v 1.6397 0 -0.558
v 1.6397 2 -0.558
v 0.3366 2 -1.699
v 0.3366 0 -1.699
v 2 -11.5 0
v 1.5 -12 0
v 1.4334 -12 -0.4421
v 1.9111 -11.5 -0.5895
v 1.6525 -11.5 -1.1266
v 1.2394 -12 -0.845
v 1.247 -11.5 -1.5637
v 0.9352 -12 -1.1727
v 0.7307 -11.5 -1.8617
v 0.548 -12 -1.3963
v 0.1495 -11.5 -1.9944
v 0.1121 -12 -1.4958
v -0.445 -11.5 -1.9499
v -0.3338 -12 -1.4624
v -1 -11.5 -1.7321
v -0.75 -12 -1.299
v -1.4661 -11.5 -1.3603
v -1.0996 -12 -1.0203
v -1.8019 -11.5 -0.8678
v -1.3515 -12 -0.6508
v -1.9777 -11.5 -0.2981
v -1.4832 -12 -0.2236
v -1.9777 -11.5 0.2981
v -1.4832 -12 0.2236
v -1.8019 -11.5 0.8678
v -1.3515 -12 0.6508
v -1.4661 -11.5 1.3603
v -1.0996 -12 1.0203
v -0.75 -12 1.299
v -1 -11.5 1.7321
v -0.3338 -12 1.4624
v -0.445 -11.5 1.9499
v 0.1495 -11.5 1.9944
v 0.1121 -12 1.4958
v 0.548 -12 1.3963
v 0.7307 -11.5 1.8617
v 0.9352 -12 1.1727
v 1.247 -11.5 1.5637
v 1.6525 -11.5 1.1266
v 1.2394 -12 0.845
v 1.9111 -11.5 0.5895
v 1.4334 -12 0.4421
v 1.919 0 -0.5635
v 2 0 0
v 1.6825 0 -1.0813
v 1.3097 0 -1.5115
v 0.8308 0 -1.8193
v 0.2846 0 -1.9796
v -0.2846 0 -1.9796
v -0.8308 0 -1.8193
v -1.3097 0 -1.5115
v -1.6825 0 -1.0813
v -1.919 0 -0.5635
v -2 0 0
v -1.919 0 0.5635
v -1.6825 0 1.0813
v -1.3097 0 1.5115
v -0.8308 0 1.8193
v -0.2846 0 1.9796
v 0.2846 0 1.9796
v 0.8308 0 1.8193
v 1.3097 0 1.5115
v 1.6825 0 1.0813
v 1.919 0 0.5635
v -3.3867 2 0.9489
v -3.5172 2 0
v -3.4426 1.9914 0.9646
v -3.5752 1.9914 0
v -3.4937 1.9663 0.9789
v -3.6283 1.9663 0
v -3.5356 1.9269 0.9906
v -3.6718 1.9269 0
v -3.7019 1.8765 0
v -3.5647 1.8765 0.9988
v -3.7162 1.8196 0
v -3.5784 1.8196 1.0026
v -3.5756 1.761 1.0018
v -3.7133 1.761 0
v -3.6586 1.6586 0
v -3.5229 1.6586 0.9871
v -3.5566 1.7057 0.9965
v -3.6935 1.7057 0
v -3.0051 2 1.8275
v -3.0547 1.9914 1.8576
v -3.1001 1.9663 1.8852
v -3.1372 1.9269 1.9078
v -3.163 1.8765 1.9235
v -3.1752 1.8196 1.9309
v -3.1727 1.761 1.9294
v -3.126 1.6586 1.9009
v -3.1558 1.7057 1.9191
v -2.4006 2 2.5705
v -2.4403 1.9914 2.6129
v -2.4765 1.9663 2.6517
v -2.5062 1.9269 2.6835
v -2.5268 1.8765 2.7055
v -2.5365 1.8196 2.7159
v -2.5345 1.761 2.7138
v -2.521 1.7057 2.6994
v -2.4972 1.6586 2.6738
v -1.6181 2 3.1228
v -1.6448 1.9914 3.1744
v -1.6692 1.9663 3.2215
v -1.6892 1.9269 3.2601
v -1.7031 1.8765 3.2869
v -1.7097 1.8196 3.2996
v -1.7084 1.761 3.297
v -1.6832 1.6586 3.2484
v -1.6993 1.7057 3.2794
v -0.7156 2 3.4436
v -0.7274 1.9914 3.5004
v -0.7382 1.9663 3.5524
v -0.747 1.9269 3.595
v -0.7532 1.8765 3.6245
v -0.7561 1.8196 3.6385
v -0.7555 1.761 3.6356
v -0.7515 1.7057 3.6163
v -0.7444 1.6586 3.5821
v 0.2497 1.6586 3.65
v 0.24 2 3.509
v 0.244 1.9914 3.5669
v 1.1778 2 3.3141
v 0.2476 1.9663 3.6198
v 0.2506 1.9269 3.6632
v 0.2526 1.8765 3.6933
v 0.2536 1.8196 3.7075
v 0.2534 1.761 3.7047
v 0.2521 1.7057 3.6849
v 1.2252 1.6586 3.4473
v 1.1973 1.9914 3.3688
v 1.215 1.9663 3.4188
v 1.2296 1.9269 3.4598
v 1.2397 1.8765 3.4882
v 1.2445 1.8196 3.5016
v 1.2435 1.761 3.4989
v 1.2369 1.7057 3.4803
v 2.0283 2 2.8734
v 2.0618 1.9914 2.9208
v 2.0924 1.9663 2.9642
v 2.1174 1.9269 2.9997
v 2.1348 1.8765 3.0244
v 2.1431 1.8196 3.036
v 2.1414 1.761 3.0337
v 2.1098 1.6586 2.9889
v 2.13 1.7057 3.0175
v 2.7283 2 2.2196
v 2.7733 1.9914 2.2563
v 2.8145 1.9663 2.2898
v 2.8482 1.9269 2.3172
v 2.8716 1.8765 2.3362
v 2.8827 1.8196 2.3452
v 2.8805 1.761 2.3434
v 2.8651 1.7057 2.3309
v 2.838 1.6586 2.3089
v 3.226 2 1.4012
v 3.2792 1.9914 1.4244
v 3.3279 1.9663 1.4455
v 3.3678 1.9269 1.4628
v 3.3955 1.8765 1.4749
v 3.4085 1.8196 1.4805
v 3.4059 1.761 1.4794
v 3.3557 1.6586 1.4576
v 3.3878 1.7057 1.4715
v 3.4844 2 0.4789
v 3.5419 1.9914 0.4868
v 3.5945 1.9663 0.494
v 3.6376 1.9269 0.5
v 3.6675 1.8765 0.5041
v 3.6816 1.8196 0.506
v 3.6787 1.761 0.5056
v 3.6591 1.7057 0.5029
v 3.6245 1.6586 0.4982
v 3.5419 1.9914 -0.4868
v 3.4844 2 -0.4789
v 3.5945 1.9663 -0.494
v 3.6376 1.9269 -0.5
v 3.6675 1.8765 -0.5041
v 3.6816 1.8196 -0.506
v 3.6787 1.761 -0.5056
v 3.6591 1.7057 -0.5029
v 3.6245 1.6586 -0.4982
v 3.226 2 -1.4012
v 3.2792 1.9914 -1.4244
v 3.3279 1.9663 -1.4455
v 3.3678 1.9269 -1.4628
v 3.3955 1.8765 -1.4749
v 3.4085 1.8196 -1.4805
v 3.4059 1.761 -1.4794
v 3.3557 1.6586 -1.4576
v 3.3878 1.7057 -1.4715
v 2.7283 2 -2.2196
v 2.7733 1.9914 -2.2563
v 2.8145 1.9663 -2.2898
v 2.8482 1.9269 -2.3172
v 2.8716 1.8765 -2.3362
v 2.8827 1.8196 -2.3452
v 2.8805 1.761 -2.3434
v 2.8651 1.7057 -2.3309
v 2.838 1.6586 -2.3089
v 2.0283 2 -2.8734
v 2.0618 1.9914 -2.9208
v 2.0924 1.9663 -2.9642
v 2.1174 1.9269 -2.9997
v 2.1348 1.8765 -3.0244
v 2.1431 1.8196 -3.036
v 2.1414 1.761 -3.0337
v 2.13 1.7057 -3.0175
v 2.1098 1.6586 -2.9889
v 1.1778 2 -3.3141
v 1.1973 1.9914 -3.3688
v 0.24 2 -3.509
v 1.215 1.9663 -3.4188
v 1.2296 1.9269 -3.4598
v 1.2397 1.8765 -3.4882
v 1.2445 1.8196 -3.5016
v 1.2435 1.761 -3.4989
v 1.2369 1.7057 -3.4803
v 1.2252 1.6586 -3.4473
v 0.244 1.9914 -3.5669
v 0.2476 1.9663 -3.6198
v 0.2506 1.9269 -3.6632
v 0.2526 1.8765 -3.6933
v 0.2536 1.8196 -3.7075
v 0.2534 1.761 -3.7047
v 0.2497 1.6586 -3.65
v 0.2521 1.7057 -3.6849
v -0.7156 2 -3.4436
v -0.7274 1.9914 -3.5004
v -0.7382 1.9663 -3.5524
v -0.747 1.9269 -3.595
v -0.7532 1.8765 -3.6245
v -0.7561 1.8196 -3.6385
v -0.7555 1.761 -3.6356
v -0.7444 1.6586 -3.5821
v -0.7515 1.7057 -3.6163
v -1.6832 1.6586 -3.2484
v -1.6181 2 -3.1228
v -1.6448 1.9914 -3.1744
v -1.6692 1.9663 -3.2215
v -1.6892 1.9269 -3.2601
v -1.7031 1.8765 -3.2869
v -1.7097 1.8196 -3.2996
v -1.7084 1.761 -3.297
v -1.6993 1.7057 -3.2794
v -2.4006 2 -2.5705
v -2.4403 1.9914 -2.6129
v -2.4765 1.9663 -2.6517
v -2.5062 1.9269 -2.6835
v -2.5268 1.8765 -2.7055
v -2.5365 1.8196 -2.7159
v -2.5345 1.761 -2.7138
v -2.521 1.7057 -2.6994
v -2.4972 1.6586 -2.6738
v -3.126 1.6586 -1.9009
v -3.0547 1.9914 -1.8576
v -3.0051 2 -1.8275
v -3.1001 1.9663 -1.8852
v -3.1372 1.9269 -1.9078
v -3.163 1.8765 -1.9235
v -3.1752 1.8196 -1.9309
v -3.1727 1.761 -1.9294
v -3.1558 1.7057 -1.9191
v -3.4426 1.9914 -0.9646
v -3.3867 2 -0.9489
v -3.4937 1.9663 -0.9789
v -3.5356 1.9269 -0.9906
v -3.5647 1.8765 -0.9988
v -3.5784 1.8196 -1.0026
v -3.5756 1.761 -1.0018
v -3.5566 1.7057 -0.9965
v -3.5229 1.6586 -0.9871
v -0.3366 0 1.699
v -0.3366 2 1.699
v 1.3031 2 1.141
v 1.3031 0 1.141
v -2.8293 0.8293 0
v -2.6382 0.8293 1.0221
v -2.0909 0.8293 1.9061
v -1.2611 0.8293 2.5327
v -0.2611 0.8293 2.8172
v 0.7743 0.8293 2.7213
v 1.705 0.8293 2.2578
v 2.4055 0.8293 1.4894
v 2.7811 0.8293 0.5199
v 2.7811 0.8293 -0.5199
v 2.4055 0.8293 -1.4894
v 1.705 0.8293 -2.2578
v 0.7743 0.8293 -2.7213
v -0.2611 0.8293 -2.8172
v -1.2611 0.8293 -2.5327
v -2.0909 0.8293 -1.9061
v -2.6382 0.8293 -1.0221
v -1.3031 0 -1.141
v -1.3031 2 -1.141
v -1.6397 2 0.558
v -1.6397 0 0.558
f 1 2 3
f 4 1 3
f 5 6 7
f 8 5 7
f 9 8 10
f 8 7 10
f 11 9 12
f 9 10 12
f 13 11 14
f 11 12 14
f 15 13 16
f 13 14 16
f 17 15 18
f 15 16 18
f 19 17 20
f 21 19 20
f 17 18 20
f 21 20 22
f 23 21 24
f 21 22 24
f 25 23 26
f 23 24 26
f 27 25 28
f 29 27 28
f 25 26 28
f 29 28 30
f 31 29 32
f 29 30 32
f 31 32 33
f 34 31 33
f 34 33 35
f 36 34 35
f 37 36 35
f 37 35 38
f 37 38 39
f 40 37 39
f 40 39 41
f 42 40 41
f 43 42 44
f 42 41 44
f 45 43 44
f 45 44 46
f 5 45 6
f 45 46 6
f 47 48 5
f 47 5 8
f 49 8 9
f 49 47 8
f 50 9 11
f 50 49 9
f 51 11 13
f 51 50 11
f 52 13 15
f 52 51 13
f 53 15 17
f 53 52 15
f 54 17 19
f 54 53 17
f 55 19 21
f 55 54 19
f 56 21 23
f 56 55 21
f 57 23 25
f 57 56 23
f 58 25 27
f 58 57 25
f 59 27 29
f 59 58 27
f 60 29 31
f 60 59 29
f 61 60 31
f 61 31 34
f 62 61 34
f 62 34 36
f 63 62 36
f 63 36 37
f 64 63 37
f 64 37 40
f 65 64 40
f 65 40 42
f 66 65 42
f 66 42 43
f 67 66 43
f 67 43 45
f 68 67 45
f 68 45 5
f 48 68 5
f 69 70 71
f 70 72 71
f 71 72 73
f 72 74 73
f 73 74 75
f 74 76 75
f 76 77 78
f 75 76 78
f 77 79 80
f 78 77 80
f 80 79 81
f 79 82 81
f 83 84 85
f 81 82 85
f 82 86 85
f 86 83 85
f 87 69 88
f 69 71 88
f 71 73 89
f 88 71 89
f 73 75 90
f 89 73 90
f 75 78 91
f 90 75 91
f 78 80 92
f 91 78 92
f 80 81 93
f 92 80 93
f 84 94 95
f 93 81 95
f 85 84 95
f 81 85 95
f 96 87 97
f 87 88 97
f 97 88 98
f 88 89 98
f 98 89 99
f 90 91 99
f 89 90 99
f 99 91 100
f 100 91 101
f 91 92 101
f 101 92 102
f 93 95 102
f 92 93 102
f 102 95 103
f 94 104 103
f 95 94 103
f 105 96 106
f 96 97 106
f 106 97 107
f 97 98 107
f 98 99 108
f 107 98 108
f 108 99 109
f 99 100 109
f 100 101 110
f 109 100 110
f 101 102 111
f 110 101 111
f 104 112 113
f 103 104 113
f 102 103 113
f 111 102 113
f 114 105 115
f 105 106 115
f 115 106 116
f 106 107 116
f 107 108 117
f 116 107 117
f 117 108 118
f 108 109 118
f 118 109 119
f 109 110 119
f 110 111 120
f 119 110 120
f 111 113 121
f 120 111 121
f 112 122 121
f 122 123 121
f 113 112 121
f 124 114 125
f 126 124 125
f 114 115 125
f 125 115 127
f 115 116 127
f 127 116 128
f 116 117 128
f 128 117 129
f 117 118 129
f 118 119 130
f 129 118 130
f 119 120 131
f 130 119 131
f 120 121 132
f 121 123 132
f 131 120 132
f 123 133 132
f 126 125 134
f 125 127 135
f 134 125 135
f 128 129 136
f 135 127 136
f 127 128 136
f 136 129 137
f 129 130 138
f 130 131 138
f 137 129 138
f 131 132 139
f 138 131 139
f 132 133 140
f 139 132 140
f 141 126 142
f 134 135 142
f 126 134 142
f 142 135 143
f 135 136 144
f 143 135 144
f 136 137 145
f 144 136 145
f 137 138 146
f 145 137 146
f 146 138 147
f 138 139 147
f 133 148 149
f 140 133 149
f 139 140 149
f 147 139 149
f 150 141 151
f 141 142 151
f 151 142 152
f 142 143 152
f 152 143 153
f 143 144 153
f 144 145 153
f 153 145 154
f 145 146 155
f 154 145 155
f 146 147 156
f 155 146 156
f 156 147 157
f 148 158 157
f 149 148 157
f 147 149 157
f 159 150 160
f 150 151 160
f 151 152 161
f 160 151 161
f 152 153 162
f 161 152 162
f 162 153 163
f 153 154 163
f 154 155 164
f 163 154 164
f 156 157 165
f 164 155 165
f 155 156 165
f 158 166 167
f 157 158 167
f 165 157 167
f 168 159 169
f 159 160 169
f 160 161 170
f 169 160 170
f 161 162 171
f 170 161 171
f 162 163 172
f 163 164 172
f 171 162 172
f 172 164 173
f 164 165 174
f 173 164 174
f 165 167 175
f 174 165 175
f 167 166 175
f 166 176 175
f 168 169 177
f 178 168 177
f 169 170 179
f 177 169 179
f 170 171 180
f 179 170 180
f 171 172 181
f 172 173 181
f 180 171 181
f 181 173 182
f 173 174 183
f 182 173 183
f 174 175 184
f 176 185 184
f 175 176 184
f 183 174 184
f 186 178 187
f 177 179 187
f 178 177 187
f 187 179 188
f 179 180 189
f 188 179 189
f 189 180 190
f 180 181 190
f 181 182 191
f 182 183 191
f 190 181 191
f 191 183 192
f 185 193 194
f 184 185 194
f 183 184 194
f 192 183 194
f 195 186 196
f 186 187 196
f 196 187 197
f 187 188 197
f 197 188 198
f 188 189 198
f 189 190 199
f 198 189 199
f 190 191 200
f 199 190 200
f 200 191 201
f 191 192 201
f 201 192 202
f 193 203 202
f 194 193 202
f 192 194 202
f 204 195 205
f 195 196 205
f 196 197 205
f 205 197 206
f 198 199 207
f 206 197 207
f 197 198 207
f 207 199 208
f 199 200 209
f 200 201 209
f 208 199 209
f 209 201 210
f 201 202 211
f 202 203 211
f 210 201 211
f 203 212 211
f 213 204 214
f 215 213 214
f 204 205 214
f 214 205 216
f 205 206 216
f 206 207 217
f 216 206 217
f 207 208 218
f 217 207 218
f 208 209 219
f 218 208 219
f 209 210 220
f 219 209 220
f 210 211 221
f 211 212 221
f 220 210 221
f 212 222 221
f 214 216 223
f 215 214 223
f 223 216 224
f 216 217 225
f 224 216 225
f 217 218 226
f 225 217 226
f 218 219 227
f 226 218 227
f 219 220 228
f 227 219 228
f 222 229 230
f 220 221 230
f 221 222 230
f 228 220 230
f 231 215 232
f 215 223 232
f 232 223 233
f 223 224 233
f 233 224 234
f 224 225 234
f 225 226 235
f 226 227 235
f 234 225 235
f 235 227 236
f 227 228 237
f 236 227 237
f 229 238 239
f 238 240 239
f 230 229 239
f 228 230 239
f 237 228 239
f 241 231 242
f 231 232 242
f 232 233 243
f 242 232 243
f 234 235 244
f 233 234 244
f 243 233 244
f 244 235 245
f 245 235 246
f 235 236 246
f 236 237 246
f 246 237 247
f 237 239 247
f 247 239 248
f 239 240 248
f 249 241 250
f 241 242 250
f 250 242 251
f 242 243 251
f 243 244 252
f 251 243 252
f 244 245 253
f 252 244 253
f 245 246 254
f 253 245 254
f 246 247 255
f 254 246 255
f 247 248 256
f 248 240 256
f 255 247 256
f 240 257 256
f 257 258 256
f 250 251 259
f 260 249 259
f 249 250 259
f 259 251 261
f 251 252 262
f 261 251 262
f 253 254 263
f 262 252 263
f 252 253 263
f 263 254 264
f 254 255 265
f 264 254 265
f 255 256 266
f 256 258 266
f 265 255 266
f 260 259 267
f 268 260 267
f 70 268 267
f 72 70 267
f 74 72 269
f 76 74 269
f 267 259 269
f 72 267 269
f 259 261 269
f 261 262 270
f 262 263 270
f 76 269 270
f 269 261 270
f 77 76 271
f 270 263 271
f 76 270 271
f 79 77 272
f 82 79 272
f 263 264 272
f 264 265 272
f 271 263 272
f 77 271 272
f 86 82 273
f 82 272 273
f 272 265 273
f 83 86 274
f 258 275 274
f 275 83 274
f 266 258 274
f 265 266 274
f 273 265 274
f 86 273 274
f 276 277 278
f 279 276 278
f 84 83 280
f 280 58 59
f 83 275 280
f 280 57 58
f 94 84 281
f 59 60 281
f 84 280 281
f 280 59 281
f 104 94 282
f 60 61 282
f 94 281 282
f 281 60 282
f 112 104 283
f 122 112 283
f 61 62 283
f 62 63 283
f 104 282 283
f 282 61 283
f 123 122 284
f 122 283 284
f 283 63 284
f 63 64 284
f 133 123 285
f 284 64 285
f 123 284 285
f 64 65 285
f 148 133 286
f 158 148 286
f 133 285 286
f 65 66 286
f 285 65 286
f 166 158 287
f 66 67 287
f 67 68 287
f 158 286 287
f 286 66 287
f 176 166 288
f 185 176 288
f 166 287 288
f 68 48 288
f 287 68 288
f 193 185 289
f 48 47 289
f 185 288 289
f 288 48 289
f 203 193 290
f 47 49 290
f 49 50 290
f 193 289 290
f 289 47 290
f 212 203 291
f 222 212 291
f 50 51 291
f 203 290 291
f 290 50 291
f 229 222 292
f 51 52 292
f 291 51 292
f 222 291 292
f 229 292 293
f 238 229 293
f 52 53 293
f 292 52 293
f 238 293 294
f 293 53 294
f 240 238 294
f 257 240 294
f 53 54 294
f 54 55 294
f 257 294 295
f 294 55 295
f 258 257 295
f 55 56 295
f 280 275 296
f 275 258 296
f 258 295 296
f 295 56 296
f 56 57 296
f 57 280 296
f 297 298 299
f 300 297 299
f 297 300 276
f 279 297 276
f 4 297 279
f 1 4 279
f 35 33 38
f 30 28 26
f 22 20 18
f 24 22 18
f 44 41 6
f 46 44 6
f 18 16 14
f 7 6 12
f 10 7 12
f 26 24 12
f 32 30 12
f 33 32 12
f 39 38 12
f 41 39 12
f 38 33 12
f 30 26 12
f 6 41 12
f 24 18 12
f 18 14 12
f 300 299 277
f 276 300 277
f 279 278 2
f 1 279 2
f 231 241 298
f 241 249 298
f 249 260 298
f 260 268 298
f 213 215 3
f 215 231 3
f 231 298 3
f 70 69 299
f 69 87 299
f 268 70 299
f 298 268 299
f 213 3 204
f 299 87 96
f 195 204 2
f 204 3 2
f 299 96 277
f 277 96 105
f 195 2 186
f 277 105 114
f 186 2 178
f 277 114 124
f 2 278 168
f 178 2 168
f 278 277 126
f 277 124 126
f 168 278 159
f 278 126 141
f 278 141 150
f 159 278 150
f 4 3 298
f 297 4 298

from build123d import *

# Parameters (mm, degrees)
SKETCH1_R           = 2
BOSS_EXTRUDE3_DEPTH = 12
CHAMFER2_SIZE       = 0.5
CUT_EXTRUDE1_DEPTH  = 2


with BuildPart() as part:
    # Sketch1 → Boss-Extrude3 (new body)
    with BuildSketch(Plane(origin=(0, 0, 0), x_dir=(1, 0, 0), z_dir=(0, 1, 0))):
        Circle(SKETCH1_R)
    extrude(amount=-BOSS_EXTRUDE3_DEPTH)

    # Sketch3 → Revolve2 (revolve)
    with BuildSketch(Plane.XY):
        with BuildLine():
            Line((-2, 0), (0, 0))
            Line((0, 0), (0, 2))
            Line((0, 2), (-3.517157288, 2))
            ThreePointArc((-3.517157288, 2), (-3.701933194, 1.876536686), (-3.658578644, 1.658578644))
            Line((-3.658578644, 1.658578644), (-2, 0))
        make_face()
    revolve(axis=Axis((0, -2, 0), (0, 1, 0)))

    # Chamfer2
    chamfer2_edges = [part.edges().sort_by_distance(p)[0] for p in [
        (-2, -12, 0),
    ]]
    chamfer(chamfer2_edges, length=CHAMFER2_SIZE)

    # Sketch4 → Cut-Extrude1 (cut)
    with BuildSketch(Plane(origin=(0, 2, 0), x_dir=(1, 0, 0), z_dir=(0, 1, 0))):
        Polygon((1.303085549, -1.141038146), (1.639710796, 0.557986116), (0.336625247, 1.699024262), (-1.303085549, 1.141038146), (-1.639710796, -0.557986116), (-0.336625247, -1.699024262), align=None)
    extrude(amount=-CUT_EXTRUDE1_DEPTH, mode=Mode.SUBTRACT)


solid = part.part
